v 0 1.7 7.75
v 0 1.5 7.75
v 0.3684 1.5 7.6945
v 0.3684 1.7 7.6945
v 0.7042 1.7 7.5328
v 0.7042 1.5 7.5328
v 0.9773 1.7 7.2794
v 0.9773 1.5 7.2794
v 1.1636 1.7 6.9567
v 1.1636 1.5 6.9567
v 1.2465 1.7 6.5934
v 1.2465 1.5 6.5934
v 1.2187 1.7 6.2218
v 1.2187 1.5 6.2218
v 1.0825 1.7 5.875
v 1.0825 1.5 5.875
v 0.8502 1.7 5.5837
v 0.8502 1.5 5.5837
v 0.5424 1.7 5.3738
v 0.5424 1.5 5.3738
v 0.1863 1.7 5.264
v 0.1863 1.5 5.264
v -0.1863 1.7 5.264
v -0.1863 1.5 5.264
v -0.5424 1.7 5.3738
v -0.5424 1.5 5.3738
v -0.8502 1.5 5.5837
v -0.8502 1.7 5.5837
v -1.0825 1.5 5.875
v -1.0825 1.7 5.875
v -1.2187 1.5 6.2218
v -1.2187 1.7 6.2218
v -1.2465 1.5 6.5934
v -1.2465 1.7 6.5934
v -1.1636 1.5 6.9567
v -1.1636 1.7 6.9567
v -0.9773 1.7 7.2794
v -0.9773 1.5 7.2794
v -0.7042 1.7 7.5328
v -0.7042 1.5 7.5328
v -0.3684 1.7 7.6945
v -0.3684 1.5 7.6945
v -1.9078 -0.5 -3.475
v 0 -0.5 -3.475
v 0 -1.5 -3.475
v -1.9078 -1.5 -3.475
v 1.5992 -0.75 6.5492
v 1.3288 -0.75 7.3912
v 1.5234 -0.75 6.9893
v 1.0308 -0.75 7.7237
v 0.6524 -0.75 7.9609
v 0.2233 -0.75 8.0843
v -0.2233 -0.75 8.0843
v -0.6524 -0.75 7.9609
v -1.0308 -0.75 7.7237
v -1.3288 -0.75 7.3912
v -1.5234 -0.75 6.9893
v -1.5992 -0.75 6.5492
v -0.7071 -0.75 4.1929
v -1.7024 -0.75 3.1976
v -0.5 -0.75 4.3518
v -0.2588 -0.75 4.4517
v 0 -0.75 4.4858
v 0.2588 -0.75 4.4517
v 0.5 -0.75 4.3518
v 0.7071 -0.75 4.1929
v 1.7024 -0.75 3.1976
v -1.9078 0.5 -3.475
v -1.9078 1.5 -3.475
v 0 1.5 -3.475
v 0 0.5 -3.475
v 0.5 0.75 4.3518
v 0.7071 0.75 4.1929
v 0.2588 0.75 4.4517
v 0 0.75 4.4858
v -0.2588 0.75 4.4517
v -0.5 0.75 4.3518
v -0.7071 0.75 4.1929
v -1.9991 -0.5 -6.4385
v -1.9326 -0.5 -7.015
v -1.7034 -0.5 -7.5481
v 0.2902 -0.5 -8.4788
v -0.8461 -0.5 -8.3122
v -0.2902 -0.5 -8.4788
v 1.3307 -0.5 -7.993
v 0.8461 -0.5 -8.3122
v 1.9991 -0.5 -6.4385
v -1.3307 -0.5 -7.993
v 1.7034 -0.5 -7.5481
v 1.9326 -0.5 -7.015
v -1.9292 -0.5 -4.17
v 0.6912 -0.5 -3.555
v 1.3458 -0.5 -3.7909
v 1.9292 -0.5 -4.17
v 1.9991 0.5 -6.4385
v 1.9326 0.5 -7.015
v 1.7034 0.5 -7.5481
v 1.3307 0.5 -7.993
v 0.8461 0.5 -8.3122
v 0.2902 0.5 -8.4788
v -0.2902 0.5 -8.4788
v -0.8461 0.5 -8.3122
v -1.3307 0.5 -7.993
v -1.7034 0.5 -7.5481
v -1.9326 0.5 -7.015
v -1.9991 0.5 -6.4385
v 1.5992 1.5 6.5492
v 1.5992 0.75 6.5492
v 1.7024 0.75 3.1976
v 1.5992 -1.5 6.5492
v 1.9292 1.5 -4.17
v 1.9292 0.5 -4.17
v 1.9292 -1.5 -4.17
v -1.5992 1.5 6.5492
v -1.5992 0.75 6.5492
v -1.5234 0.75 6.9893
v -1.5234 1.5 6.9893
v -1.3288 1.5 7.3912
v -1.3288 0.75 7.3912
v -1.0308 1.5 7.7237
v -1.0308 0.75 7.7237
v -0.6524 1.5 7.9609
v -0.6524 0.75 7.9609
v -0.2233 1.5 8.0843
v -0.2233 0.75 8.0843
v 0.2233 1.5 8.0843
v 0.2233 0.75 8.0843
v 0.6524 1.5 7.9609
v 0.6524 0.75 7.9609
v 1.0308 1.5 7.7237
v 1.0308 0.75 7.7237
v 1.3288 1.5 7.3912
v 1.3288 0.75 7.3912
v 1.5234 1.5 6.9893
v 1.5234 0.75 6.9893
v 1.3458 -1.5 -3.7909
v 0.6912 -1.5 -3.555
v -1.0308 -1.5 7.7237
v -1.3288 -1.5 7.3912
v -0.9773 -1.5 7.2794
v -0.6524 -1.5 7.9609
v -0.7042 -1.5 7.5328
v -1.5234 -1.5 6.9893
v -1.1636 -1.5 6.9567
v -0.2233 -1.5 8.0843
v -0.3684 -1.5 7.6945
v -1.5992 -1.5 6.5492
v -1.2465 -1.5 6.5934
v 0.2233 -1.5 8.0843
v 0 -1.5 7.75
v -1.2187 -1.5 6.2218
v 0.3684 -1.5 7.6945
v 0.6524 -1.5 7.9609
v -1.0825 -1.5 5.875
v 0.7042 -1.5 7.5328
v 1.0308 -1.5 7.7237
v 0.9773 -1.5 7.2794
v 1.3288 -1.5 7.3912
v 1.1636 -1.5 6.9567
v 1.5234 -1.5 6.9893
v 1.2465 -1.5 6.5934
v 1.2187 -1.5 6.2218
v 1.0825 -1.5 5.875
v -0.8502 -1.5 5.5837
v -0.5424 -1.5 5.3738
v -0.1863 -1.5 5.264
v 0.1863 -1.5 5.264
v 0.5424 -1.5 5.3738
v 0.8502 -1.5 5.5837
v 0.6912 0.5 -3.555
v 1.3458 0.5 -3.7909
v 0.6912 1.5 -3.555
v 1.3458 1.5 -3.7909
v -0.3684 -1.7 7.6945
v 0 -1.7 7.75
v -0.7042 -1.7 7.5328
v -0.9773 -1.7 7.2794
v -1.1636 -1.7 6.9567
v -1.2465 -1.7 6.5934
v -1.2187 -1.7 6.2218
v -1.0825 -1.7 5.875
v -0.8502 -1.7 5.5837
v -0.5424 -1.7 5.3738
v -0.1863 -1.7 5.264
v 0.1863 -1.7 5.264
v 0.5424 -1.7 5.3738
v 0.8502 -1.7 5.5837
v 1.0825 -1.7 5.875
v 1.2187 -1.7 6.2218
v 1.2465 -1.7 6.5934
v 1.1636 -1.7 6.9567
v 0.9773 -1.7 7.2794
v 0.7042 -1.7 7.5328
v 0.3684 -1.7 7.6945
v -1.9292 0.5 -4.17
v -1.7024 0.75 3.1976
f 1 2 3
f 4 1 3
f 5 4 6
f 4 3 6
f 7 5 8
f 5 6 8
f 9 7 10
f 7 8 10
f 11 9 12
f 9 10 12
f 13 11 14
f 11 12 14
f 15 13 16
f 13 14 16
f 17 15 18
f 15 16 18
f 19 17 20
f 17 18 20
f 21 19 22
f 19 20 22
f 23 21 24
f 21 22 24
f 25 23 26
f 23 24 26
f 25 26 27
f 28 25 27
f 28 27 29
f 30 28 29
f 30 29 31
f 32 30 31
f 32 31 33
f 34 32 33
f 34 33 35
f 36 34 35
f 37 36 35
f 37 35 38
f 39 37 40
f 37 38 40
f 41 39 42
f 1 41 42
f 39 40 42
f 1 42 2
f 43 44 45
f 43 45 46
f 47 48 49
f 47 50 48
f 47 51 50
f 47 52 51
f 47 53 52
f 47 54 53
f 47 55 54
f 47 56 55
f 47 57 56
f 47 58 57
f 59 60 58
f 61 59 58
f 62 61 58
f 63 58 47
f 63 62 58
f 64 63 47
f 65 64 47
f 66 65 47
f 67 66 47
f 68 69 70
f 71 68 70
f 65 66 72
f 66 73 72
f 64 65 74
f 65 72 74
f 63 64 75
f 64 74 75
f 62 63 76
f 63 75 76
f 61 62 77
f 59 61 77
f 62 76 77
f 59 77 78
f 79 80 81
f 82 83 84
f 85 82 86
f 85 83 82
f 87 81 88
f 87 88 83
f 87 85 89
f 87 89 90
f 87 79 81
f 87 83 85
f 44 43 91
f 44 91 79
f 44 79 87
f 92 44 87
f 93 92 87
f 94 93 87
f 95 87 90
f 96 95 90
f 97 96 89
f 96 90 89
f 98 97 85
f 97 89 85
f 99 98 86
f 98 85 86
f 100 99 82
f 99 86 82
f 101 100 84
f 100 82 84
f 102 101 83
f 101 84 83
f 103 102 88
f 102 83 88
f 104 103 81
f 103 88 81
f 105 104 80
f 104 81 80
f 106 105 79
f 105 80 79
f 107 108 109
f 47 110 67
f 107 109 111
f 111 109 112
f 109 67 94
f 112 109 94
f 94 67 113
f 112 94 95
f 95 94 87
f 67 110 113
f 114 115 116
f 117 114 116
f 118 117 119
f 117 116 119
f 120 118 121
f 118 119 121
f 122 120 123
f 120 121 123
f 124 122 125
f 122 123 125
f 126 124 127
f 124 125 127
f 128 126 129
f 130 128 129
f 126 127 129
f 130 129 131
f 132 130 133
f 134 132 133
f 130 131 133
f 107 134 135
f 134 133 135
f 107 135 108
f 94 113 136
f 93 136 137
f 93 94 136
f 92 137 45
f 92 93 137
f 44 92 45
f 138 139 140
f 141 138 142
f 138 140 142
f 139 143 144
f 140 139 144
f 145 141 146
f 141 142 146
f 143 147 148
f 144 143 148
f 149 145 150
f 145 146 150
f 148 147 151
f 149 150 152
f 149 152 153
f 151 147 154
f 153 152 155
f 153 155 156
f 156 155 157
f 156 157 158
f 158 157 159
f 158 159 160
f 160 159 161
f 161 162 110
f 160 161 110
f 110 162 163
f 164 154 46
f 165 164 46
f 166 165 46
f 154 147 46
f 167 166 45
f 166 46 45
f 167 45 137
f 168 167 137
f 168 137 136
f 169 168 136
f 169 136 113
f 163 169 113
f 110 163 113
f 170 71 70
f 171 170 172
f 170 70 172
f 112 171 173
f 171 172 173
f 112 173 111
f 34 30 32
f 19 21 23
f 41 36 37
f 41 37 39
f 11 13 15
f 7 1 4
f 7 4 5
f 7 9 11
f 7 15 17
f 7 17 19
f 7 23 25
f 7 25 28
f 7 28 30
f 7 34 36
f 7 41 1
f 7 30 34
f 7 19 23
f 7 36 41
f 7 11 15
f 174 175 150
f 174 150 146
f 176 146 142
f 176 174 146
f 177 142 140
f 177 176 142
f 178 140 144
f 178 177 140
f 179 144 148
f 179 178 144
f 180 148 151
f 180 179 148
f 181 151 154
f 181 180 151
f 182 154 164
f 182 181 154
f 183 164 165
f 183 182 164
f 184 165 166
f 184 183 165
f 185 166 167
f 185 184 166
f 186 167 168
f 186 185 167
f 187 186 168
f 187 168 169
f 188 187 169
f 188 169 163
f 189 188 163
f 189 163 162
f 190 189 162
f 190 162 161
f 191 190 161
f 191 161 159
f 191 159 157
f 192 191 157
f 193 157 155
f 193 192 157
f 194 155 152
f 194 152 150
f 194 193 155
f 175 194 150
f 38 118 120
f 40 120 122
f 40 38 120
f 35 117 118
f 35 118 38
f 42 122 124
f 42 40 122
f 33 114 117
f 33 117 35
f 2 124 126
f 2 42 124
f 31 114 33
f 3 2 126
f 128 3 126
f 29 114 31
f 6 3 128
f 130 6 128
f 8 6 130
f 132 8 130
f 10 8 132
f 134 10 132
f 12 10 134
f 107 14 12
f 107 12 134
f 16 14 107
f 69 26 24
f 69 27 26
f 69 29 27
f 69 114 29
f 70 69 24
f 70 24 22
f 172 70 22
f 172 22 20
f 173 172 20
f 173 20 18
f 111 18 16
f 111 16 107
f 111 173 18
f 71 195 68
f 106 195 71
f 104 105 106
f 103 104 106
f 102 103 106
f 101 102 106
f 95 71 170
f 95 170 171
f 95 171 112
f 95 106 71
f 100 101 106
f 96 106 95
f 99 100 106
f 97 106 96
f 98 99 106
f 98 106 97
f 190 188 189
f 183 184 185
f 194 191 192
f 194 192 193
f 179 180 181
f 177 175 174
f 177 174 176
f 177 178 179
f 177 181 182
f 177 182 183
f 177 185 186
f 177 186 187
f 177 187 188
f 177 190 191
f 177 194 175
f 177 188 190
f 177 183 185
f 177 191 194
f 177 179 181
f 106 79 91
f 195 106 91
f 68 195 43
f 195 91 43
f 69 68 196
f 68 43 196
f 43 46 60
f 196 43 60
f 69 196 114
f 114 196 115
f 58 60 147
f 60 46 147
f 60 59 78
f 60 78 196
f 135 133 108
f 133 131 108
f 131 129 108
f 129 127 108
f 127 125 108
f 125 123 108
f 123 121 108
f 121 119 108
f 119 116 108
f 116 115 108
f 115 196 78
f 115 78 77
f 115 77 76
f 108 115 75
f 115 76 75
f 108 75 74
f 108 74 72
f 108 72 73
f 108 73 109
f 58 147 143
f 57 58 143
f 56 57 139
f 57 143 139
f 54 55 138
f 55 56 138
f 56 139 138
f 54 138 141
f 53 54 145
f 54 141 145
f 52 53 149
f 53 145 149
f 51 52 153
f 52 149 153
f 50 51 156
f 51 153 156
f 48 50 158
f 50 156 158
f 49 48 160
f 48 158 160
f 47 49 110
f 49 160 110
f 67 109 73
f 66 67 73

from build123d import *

# Parameters (mm, degrees)
BOSS_EXTRUDE1_DEPTH      = 1.5
BOSS_EXTRUDE1_DEPTH_BACK = 1.5
SKETCH1_R                = 1.6
SKETCH1_R_2              = 2
SKETCH2_R                = 3.025
CUT_EXTRUDE1_DEPTH       = 1
CUT_EXTRUDE2_START       = -1
SKETCH3_R                = 3.025
CUT_EXTRUDE2_DEPTH       = 1
CUT_EXTRUDE3_DEPTH       = 0.75
CUT_EXTRUDE3_DEPTH_BACK  = 0.75
SKETCH4_R                = 1.6
FILLET1_R                = 1
SKETCH5_R                = 1.25
BOSS_EXTRUDE2_DEPTH      = 0.2
BOSS_EXTRUDE3_START      = 0.2
SKETCH6_R                = 1.25
BOSS_EXTRUDE3_DEPTH      = 0.2
CUT_EXTRUDE4_DEPTH       = 1
CUT_EXTRUDE5_START       = -1
CUT_EXTRUDE5_DEPTH       = 1


with BuildPart() as part:
    # Sketch1 → Boss-Extrude1 (new, two sides: drawn at the far end of the back side and taken through both)
    with BuildSketch(Plane(origin=(0, 0, 0), x_dir=(1, 0, 0), z_dir=(0, 1, 0)).offset(-BOSS_EXTRUDE1_DEPTH_BACK)):
        with Locations((0, -6.5)):
            Circle(SKETCH1_R)
        with BuildLine():
            Line((-1.99905303, 6.438461538), (-1.599242424, -6.549230769))
            ThreePointArc((-1.599242424, -6.549230769), (-0.024618299, -4.900189405), (1.6, -6.5))
            ThreePointArc((1.6, -6.5), (1.599810595, -6.524618299), (1.599242424, -6.549230769))
            Line((1.599242424, -6.549230769), (1.99905303, 6.438461538))
            ThreePointArc((1.99905303, 6.438461538), (0, 4.5), (-1.99905303, 6.438461538))
        make_face()
        with Locations((0, 6.5)):
            Circle(SKETCH1_R_2)
    extrude(amount=BOSS_EXTRUDE1_DEPTH + BOSS_EXTRUDE1_DEPTH_BACK)

    # Sketch2 → Cut-Extrude1 (cut)
    with BuildSketch(Plane(origin=(0, 1.5, 0), x_dir=(1, 0, 0), z_dir=(0, 1, 0))):
        with Locations((0, 6.5)):
            Circle(SKETCH2_R)
    extrude(amount=-CUT_EXTRUDE1_DEPTH, mode=Mode.SUBTRACT)

    # Sketch3 → Cut-Extrude2 (cut)
    with BuildSketch(Plane.XZ.offset(1.5).offset(CUT_EXTRUDE2_START)):
        with Locations((0, -6.5)):
            Circle(SKETCH3_R)
    extrude(amount=CUT_EXTRUDE2_DEPTH, mode=Mode.SUBTRACT)

    # Sketch4 → Cut-Extrude3 (cut, two sides: drawn at the far end of the back side and taken through both)
    with BuildSketch(Plane(origin=(0, 0, 0), x_dir=(1, 0, 0), z_dir=(0, 1, 0)).offset(-CUT_EXTRUDE3_DEPTH_BACK)):
        with BuildLine():
            ThreePointArc((-1.6, -6.5), (-1.13137085, -5.36862915), (0, -4.9))
            Line((0, -4.9), (-163.946907064, 159.046907064))
            Line((-163.946907064, 159.046907064), (-163.946907064, -6.5))
            Line((-163.946907064, -6.5), (-1.6, -6.5))
        make_face()
        with BuildLine():
            Line((161.955462973, 157.055462973), (0, -4.9))
            ThreePointArc((0, -4.9), (1.13137085, -5.36862915), (1.6, -6.5))
            Line((1.6, -6.5), (161.955462973, -6.5))
            Line((161.955462973, -6.5), (161.955462973, 157.055462973))
        make_face()
        with BuildLine():
            Line((1.6, -6.5), (0, -6.5))
            Line((0, -6.5), (-1.6, -6.5))
            ThreePointArc((-1.6, -6.5), (0, -8.1), (1.6, -6.5))
        make_face()
        with BuildLine():
            Line((0, -4.9), (0, -6.5))
            Line((0, -6.5), (1.6, -6.5))
            ThreePointArc((1.6, -6.5), (1.13137085, -5.36862915), (0, -4.9))
        make_face()
        with BuildLine():
            Line((-1.6, -6.5), (0, -6.5))
            Line((0, -6.5), (0, -4.9))
            ThreePointArc((0, -4.9), (-1.13137085, -5.36862915), (-1.6, -6.5))
        make_face()
        with Locations((0, -6.5)):
            Circle(SKETCH4_R)
        Polygon((0, -6.5), (-163.946907064, -6.5), (0, -276.849985612), (161.955462973, -6.5), align=None)
    extrude(amount=CUT_EXTRUDE3_DEPTH + CUT_EXTRUDE3_DEPTH_BACK, mode=Mode.SUBTRACT)

    # Fillet1
    fillet1_edges = [part.edges().sort_by_distance(p)[0] for p in [
        (0, 0, 4.9),
    ]]
    fillet(fillet1_edges, radius=FILLET1_R)

    # Sketch5 → Boss-Extrude2 (add)
    with BuildSketch(Plane(origin=(0, 1.5, 0), x_dir=(1, 0, 0), z_dir=(0, 1, 0))):
        with Locations(Location((0, -6.5, 0), (0, 0, 270))):
            Circle(SKETCH5_R)
    extrude(amount=BOSS_EXTRUDE2_DEPTH)

    # Sketch6 → Boss-Extrude3 (add)
    with BuildSketch(Plane.XZ.offset(1.5).offset(BOSS_EXTRUDE3_START)):
        with Locations(Location((0, 6.5, 0), (0, 0, 90))):
            Circle(SKETCH6_R)
    extrude(amount=-BOSS_EXTRUDE3_DEPTH)

    # Sketch7 → Cut-Extrude4 (cut)
    with BuildSketch(Plane(origin=(0, 1.5, 0), x_dir=(1, 0, 0), z_dir=(0, 1, 0))):
        with BuildLine():
            Line((-1.907826404, 3.475), (0, 3.475))
            ThreePointArc((0, 3.475), (-1.025301843, 3.654058832), (-1.929222297, 4.170037268))
            Line((-1.929222297, 4.170037268), (-1.907826404, 3.475))
        make_face()
    extrude(amount=-CUT_EXTRUDE4_DEPTH, mode=Mode.SUBTRACT)

    # Sketch8 → Cut-Extrude5 (cut)
    with BuildSketch(Plane.XZ.offset(1.5).offset(CUT_EXTRUDE5_START)):
        with BuildLine():
            ThreePointArc((-1.929222297, -4.170037268), (-1.025301843, -3.654058832), (0, -3.475))
            Line((0, -3.475), (-1.907826404, -3.475))
            Line((-1.907826404, -3.475), (-1.929222297, -4.170037268))
        make_face()
    extrude(amount=CUT_EXTRUDE5_DEPTH, mode=Mode.SUBTRACT)


solid = part.part
